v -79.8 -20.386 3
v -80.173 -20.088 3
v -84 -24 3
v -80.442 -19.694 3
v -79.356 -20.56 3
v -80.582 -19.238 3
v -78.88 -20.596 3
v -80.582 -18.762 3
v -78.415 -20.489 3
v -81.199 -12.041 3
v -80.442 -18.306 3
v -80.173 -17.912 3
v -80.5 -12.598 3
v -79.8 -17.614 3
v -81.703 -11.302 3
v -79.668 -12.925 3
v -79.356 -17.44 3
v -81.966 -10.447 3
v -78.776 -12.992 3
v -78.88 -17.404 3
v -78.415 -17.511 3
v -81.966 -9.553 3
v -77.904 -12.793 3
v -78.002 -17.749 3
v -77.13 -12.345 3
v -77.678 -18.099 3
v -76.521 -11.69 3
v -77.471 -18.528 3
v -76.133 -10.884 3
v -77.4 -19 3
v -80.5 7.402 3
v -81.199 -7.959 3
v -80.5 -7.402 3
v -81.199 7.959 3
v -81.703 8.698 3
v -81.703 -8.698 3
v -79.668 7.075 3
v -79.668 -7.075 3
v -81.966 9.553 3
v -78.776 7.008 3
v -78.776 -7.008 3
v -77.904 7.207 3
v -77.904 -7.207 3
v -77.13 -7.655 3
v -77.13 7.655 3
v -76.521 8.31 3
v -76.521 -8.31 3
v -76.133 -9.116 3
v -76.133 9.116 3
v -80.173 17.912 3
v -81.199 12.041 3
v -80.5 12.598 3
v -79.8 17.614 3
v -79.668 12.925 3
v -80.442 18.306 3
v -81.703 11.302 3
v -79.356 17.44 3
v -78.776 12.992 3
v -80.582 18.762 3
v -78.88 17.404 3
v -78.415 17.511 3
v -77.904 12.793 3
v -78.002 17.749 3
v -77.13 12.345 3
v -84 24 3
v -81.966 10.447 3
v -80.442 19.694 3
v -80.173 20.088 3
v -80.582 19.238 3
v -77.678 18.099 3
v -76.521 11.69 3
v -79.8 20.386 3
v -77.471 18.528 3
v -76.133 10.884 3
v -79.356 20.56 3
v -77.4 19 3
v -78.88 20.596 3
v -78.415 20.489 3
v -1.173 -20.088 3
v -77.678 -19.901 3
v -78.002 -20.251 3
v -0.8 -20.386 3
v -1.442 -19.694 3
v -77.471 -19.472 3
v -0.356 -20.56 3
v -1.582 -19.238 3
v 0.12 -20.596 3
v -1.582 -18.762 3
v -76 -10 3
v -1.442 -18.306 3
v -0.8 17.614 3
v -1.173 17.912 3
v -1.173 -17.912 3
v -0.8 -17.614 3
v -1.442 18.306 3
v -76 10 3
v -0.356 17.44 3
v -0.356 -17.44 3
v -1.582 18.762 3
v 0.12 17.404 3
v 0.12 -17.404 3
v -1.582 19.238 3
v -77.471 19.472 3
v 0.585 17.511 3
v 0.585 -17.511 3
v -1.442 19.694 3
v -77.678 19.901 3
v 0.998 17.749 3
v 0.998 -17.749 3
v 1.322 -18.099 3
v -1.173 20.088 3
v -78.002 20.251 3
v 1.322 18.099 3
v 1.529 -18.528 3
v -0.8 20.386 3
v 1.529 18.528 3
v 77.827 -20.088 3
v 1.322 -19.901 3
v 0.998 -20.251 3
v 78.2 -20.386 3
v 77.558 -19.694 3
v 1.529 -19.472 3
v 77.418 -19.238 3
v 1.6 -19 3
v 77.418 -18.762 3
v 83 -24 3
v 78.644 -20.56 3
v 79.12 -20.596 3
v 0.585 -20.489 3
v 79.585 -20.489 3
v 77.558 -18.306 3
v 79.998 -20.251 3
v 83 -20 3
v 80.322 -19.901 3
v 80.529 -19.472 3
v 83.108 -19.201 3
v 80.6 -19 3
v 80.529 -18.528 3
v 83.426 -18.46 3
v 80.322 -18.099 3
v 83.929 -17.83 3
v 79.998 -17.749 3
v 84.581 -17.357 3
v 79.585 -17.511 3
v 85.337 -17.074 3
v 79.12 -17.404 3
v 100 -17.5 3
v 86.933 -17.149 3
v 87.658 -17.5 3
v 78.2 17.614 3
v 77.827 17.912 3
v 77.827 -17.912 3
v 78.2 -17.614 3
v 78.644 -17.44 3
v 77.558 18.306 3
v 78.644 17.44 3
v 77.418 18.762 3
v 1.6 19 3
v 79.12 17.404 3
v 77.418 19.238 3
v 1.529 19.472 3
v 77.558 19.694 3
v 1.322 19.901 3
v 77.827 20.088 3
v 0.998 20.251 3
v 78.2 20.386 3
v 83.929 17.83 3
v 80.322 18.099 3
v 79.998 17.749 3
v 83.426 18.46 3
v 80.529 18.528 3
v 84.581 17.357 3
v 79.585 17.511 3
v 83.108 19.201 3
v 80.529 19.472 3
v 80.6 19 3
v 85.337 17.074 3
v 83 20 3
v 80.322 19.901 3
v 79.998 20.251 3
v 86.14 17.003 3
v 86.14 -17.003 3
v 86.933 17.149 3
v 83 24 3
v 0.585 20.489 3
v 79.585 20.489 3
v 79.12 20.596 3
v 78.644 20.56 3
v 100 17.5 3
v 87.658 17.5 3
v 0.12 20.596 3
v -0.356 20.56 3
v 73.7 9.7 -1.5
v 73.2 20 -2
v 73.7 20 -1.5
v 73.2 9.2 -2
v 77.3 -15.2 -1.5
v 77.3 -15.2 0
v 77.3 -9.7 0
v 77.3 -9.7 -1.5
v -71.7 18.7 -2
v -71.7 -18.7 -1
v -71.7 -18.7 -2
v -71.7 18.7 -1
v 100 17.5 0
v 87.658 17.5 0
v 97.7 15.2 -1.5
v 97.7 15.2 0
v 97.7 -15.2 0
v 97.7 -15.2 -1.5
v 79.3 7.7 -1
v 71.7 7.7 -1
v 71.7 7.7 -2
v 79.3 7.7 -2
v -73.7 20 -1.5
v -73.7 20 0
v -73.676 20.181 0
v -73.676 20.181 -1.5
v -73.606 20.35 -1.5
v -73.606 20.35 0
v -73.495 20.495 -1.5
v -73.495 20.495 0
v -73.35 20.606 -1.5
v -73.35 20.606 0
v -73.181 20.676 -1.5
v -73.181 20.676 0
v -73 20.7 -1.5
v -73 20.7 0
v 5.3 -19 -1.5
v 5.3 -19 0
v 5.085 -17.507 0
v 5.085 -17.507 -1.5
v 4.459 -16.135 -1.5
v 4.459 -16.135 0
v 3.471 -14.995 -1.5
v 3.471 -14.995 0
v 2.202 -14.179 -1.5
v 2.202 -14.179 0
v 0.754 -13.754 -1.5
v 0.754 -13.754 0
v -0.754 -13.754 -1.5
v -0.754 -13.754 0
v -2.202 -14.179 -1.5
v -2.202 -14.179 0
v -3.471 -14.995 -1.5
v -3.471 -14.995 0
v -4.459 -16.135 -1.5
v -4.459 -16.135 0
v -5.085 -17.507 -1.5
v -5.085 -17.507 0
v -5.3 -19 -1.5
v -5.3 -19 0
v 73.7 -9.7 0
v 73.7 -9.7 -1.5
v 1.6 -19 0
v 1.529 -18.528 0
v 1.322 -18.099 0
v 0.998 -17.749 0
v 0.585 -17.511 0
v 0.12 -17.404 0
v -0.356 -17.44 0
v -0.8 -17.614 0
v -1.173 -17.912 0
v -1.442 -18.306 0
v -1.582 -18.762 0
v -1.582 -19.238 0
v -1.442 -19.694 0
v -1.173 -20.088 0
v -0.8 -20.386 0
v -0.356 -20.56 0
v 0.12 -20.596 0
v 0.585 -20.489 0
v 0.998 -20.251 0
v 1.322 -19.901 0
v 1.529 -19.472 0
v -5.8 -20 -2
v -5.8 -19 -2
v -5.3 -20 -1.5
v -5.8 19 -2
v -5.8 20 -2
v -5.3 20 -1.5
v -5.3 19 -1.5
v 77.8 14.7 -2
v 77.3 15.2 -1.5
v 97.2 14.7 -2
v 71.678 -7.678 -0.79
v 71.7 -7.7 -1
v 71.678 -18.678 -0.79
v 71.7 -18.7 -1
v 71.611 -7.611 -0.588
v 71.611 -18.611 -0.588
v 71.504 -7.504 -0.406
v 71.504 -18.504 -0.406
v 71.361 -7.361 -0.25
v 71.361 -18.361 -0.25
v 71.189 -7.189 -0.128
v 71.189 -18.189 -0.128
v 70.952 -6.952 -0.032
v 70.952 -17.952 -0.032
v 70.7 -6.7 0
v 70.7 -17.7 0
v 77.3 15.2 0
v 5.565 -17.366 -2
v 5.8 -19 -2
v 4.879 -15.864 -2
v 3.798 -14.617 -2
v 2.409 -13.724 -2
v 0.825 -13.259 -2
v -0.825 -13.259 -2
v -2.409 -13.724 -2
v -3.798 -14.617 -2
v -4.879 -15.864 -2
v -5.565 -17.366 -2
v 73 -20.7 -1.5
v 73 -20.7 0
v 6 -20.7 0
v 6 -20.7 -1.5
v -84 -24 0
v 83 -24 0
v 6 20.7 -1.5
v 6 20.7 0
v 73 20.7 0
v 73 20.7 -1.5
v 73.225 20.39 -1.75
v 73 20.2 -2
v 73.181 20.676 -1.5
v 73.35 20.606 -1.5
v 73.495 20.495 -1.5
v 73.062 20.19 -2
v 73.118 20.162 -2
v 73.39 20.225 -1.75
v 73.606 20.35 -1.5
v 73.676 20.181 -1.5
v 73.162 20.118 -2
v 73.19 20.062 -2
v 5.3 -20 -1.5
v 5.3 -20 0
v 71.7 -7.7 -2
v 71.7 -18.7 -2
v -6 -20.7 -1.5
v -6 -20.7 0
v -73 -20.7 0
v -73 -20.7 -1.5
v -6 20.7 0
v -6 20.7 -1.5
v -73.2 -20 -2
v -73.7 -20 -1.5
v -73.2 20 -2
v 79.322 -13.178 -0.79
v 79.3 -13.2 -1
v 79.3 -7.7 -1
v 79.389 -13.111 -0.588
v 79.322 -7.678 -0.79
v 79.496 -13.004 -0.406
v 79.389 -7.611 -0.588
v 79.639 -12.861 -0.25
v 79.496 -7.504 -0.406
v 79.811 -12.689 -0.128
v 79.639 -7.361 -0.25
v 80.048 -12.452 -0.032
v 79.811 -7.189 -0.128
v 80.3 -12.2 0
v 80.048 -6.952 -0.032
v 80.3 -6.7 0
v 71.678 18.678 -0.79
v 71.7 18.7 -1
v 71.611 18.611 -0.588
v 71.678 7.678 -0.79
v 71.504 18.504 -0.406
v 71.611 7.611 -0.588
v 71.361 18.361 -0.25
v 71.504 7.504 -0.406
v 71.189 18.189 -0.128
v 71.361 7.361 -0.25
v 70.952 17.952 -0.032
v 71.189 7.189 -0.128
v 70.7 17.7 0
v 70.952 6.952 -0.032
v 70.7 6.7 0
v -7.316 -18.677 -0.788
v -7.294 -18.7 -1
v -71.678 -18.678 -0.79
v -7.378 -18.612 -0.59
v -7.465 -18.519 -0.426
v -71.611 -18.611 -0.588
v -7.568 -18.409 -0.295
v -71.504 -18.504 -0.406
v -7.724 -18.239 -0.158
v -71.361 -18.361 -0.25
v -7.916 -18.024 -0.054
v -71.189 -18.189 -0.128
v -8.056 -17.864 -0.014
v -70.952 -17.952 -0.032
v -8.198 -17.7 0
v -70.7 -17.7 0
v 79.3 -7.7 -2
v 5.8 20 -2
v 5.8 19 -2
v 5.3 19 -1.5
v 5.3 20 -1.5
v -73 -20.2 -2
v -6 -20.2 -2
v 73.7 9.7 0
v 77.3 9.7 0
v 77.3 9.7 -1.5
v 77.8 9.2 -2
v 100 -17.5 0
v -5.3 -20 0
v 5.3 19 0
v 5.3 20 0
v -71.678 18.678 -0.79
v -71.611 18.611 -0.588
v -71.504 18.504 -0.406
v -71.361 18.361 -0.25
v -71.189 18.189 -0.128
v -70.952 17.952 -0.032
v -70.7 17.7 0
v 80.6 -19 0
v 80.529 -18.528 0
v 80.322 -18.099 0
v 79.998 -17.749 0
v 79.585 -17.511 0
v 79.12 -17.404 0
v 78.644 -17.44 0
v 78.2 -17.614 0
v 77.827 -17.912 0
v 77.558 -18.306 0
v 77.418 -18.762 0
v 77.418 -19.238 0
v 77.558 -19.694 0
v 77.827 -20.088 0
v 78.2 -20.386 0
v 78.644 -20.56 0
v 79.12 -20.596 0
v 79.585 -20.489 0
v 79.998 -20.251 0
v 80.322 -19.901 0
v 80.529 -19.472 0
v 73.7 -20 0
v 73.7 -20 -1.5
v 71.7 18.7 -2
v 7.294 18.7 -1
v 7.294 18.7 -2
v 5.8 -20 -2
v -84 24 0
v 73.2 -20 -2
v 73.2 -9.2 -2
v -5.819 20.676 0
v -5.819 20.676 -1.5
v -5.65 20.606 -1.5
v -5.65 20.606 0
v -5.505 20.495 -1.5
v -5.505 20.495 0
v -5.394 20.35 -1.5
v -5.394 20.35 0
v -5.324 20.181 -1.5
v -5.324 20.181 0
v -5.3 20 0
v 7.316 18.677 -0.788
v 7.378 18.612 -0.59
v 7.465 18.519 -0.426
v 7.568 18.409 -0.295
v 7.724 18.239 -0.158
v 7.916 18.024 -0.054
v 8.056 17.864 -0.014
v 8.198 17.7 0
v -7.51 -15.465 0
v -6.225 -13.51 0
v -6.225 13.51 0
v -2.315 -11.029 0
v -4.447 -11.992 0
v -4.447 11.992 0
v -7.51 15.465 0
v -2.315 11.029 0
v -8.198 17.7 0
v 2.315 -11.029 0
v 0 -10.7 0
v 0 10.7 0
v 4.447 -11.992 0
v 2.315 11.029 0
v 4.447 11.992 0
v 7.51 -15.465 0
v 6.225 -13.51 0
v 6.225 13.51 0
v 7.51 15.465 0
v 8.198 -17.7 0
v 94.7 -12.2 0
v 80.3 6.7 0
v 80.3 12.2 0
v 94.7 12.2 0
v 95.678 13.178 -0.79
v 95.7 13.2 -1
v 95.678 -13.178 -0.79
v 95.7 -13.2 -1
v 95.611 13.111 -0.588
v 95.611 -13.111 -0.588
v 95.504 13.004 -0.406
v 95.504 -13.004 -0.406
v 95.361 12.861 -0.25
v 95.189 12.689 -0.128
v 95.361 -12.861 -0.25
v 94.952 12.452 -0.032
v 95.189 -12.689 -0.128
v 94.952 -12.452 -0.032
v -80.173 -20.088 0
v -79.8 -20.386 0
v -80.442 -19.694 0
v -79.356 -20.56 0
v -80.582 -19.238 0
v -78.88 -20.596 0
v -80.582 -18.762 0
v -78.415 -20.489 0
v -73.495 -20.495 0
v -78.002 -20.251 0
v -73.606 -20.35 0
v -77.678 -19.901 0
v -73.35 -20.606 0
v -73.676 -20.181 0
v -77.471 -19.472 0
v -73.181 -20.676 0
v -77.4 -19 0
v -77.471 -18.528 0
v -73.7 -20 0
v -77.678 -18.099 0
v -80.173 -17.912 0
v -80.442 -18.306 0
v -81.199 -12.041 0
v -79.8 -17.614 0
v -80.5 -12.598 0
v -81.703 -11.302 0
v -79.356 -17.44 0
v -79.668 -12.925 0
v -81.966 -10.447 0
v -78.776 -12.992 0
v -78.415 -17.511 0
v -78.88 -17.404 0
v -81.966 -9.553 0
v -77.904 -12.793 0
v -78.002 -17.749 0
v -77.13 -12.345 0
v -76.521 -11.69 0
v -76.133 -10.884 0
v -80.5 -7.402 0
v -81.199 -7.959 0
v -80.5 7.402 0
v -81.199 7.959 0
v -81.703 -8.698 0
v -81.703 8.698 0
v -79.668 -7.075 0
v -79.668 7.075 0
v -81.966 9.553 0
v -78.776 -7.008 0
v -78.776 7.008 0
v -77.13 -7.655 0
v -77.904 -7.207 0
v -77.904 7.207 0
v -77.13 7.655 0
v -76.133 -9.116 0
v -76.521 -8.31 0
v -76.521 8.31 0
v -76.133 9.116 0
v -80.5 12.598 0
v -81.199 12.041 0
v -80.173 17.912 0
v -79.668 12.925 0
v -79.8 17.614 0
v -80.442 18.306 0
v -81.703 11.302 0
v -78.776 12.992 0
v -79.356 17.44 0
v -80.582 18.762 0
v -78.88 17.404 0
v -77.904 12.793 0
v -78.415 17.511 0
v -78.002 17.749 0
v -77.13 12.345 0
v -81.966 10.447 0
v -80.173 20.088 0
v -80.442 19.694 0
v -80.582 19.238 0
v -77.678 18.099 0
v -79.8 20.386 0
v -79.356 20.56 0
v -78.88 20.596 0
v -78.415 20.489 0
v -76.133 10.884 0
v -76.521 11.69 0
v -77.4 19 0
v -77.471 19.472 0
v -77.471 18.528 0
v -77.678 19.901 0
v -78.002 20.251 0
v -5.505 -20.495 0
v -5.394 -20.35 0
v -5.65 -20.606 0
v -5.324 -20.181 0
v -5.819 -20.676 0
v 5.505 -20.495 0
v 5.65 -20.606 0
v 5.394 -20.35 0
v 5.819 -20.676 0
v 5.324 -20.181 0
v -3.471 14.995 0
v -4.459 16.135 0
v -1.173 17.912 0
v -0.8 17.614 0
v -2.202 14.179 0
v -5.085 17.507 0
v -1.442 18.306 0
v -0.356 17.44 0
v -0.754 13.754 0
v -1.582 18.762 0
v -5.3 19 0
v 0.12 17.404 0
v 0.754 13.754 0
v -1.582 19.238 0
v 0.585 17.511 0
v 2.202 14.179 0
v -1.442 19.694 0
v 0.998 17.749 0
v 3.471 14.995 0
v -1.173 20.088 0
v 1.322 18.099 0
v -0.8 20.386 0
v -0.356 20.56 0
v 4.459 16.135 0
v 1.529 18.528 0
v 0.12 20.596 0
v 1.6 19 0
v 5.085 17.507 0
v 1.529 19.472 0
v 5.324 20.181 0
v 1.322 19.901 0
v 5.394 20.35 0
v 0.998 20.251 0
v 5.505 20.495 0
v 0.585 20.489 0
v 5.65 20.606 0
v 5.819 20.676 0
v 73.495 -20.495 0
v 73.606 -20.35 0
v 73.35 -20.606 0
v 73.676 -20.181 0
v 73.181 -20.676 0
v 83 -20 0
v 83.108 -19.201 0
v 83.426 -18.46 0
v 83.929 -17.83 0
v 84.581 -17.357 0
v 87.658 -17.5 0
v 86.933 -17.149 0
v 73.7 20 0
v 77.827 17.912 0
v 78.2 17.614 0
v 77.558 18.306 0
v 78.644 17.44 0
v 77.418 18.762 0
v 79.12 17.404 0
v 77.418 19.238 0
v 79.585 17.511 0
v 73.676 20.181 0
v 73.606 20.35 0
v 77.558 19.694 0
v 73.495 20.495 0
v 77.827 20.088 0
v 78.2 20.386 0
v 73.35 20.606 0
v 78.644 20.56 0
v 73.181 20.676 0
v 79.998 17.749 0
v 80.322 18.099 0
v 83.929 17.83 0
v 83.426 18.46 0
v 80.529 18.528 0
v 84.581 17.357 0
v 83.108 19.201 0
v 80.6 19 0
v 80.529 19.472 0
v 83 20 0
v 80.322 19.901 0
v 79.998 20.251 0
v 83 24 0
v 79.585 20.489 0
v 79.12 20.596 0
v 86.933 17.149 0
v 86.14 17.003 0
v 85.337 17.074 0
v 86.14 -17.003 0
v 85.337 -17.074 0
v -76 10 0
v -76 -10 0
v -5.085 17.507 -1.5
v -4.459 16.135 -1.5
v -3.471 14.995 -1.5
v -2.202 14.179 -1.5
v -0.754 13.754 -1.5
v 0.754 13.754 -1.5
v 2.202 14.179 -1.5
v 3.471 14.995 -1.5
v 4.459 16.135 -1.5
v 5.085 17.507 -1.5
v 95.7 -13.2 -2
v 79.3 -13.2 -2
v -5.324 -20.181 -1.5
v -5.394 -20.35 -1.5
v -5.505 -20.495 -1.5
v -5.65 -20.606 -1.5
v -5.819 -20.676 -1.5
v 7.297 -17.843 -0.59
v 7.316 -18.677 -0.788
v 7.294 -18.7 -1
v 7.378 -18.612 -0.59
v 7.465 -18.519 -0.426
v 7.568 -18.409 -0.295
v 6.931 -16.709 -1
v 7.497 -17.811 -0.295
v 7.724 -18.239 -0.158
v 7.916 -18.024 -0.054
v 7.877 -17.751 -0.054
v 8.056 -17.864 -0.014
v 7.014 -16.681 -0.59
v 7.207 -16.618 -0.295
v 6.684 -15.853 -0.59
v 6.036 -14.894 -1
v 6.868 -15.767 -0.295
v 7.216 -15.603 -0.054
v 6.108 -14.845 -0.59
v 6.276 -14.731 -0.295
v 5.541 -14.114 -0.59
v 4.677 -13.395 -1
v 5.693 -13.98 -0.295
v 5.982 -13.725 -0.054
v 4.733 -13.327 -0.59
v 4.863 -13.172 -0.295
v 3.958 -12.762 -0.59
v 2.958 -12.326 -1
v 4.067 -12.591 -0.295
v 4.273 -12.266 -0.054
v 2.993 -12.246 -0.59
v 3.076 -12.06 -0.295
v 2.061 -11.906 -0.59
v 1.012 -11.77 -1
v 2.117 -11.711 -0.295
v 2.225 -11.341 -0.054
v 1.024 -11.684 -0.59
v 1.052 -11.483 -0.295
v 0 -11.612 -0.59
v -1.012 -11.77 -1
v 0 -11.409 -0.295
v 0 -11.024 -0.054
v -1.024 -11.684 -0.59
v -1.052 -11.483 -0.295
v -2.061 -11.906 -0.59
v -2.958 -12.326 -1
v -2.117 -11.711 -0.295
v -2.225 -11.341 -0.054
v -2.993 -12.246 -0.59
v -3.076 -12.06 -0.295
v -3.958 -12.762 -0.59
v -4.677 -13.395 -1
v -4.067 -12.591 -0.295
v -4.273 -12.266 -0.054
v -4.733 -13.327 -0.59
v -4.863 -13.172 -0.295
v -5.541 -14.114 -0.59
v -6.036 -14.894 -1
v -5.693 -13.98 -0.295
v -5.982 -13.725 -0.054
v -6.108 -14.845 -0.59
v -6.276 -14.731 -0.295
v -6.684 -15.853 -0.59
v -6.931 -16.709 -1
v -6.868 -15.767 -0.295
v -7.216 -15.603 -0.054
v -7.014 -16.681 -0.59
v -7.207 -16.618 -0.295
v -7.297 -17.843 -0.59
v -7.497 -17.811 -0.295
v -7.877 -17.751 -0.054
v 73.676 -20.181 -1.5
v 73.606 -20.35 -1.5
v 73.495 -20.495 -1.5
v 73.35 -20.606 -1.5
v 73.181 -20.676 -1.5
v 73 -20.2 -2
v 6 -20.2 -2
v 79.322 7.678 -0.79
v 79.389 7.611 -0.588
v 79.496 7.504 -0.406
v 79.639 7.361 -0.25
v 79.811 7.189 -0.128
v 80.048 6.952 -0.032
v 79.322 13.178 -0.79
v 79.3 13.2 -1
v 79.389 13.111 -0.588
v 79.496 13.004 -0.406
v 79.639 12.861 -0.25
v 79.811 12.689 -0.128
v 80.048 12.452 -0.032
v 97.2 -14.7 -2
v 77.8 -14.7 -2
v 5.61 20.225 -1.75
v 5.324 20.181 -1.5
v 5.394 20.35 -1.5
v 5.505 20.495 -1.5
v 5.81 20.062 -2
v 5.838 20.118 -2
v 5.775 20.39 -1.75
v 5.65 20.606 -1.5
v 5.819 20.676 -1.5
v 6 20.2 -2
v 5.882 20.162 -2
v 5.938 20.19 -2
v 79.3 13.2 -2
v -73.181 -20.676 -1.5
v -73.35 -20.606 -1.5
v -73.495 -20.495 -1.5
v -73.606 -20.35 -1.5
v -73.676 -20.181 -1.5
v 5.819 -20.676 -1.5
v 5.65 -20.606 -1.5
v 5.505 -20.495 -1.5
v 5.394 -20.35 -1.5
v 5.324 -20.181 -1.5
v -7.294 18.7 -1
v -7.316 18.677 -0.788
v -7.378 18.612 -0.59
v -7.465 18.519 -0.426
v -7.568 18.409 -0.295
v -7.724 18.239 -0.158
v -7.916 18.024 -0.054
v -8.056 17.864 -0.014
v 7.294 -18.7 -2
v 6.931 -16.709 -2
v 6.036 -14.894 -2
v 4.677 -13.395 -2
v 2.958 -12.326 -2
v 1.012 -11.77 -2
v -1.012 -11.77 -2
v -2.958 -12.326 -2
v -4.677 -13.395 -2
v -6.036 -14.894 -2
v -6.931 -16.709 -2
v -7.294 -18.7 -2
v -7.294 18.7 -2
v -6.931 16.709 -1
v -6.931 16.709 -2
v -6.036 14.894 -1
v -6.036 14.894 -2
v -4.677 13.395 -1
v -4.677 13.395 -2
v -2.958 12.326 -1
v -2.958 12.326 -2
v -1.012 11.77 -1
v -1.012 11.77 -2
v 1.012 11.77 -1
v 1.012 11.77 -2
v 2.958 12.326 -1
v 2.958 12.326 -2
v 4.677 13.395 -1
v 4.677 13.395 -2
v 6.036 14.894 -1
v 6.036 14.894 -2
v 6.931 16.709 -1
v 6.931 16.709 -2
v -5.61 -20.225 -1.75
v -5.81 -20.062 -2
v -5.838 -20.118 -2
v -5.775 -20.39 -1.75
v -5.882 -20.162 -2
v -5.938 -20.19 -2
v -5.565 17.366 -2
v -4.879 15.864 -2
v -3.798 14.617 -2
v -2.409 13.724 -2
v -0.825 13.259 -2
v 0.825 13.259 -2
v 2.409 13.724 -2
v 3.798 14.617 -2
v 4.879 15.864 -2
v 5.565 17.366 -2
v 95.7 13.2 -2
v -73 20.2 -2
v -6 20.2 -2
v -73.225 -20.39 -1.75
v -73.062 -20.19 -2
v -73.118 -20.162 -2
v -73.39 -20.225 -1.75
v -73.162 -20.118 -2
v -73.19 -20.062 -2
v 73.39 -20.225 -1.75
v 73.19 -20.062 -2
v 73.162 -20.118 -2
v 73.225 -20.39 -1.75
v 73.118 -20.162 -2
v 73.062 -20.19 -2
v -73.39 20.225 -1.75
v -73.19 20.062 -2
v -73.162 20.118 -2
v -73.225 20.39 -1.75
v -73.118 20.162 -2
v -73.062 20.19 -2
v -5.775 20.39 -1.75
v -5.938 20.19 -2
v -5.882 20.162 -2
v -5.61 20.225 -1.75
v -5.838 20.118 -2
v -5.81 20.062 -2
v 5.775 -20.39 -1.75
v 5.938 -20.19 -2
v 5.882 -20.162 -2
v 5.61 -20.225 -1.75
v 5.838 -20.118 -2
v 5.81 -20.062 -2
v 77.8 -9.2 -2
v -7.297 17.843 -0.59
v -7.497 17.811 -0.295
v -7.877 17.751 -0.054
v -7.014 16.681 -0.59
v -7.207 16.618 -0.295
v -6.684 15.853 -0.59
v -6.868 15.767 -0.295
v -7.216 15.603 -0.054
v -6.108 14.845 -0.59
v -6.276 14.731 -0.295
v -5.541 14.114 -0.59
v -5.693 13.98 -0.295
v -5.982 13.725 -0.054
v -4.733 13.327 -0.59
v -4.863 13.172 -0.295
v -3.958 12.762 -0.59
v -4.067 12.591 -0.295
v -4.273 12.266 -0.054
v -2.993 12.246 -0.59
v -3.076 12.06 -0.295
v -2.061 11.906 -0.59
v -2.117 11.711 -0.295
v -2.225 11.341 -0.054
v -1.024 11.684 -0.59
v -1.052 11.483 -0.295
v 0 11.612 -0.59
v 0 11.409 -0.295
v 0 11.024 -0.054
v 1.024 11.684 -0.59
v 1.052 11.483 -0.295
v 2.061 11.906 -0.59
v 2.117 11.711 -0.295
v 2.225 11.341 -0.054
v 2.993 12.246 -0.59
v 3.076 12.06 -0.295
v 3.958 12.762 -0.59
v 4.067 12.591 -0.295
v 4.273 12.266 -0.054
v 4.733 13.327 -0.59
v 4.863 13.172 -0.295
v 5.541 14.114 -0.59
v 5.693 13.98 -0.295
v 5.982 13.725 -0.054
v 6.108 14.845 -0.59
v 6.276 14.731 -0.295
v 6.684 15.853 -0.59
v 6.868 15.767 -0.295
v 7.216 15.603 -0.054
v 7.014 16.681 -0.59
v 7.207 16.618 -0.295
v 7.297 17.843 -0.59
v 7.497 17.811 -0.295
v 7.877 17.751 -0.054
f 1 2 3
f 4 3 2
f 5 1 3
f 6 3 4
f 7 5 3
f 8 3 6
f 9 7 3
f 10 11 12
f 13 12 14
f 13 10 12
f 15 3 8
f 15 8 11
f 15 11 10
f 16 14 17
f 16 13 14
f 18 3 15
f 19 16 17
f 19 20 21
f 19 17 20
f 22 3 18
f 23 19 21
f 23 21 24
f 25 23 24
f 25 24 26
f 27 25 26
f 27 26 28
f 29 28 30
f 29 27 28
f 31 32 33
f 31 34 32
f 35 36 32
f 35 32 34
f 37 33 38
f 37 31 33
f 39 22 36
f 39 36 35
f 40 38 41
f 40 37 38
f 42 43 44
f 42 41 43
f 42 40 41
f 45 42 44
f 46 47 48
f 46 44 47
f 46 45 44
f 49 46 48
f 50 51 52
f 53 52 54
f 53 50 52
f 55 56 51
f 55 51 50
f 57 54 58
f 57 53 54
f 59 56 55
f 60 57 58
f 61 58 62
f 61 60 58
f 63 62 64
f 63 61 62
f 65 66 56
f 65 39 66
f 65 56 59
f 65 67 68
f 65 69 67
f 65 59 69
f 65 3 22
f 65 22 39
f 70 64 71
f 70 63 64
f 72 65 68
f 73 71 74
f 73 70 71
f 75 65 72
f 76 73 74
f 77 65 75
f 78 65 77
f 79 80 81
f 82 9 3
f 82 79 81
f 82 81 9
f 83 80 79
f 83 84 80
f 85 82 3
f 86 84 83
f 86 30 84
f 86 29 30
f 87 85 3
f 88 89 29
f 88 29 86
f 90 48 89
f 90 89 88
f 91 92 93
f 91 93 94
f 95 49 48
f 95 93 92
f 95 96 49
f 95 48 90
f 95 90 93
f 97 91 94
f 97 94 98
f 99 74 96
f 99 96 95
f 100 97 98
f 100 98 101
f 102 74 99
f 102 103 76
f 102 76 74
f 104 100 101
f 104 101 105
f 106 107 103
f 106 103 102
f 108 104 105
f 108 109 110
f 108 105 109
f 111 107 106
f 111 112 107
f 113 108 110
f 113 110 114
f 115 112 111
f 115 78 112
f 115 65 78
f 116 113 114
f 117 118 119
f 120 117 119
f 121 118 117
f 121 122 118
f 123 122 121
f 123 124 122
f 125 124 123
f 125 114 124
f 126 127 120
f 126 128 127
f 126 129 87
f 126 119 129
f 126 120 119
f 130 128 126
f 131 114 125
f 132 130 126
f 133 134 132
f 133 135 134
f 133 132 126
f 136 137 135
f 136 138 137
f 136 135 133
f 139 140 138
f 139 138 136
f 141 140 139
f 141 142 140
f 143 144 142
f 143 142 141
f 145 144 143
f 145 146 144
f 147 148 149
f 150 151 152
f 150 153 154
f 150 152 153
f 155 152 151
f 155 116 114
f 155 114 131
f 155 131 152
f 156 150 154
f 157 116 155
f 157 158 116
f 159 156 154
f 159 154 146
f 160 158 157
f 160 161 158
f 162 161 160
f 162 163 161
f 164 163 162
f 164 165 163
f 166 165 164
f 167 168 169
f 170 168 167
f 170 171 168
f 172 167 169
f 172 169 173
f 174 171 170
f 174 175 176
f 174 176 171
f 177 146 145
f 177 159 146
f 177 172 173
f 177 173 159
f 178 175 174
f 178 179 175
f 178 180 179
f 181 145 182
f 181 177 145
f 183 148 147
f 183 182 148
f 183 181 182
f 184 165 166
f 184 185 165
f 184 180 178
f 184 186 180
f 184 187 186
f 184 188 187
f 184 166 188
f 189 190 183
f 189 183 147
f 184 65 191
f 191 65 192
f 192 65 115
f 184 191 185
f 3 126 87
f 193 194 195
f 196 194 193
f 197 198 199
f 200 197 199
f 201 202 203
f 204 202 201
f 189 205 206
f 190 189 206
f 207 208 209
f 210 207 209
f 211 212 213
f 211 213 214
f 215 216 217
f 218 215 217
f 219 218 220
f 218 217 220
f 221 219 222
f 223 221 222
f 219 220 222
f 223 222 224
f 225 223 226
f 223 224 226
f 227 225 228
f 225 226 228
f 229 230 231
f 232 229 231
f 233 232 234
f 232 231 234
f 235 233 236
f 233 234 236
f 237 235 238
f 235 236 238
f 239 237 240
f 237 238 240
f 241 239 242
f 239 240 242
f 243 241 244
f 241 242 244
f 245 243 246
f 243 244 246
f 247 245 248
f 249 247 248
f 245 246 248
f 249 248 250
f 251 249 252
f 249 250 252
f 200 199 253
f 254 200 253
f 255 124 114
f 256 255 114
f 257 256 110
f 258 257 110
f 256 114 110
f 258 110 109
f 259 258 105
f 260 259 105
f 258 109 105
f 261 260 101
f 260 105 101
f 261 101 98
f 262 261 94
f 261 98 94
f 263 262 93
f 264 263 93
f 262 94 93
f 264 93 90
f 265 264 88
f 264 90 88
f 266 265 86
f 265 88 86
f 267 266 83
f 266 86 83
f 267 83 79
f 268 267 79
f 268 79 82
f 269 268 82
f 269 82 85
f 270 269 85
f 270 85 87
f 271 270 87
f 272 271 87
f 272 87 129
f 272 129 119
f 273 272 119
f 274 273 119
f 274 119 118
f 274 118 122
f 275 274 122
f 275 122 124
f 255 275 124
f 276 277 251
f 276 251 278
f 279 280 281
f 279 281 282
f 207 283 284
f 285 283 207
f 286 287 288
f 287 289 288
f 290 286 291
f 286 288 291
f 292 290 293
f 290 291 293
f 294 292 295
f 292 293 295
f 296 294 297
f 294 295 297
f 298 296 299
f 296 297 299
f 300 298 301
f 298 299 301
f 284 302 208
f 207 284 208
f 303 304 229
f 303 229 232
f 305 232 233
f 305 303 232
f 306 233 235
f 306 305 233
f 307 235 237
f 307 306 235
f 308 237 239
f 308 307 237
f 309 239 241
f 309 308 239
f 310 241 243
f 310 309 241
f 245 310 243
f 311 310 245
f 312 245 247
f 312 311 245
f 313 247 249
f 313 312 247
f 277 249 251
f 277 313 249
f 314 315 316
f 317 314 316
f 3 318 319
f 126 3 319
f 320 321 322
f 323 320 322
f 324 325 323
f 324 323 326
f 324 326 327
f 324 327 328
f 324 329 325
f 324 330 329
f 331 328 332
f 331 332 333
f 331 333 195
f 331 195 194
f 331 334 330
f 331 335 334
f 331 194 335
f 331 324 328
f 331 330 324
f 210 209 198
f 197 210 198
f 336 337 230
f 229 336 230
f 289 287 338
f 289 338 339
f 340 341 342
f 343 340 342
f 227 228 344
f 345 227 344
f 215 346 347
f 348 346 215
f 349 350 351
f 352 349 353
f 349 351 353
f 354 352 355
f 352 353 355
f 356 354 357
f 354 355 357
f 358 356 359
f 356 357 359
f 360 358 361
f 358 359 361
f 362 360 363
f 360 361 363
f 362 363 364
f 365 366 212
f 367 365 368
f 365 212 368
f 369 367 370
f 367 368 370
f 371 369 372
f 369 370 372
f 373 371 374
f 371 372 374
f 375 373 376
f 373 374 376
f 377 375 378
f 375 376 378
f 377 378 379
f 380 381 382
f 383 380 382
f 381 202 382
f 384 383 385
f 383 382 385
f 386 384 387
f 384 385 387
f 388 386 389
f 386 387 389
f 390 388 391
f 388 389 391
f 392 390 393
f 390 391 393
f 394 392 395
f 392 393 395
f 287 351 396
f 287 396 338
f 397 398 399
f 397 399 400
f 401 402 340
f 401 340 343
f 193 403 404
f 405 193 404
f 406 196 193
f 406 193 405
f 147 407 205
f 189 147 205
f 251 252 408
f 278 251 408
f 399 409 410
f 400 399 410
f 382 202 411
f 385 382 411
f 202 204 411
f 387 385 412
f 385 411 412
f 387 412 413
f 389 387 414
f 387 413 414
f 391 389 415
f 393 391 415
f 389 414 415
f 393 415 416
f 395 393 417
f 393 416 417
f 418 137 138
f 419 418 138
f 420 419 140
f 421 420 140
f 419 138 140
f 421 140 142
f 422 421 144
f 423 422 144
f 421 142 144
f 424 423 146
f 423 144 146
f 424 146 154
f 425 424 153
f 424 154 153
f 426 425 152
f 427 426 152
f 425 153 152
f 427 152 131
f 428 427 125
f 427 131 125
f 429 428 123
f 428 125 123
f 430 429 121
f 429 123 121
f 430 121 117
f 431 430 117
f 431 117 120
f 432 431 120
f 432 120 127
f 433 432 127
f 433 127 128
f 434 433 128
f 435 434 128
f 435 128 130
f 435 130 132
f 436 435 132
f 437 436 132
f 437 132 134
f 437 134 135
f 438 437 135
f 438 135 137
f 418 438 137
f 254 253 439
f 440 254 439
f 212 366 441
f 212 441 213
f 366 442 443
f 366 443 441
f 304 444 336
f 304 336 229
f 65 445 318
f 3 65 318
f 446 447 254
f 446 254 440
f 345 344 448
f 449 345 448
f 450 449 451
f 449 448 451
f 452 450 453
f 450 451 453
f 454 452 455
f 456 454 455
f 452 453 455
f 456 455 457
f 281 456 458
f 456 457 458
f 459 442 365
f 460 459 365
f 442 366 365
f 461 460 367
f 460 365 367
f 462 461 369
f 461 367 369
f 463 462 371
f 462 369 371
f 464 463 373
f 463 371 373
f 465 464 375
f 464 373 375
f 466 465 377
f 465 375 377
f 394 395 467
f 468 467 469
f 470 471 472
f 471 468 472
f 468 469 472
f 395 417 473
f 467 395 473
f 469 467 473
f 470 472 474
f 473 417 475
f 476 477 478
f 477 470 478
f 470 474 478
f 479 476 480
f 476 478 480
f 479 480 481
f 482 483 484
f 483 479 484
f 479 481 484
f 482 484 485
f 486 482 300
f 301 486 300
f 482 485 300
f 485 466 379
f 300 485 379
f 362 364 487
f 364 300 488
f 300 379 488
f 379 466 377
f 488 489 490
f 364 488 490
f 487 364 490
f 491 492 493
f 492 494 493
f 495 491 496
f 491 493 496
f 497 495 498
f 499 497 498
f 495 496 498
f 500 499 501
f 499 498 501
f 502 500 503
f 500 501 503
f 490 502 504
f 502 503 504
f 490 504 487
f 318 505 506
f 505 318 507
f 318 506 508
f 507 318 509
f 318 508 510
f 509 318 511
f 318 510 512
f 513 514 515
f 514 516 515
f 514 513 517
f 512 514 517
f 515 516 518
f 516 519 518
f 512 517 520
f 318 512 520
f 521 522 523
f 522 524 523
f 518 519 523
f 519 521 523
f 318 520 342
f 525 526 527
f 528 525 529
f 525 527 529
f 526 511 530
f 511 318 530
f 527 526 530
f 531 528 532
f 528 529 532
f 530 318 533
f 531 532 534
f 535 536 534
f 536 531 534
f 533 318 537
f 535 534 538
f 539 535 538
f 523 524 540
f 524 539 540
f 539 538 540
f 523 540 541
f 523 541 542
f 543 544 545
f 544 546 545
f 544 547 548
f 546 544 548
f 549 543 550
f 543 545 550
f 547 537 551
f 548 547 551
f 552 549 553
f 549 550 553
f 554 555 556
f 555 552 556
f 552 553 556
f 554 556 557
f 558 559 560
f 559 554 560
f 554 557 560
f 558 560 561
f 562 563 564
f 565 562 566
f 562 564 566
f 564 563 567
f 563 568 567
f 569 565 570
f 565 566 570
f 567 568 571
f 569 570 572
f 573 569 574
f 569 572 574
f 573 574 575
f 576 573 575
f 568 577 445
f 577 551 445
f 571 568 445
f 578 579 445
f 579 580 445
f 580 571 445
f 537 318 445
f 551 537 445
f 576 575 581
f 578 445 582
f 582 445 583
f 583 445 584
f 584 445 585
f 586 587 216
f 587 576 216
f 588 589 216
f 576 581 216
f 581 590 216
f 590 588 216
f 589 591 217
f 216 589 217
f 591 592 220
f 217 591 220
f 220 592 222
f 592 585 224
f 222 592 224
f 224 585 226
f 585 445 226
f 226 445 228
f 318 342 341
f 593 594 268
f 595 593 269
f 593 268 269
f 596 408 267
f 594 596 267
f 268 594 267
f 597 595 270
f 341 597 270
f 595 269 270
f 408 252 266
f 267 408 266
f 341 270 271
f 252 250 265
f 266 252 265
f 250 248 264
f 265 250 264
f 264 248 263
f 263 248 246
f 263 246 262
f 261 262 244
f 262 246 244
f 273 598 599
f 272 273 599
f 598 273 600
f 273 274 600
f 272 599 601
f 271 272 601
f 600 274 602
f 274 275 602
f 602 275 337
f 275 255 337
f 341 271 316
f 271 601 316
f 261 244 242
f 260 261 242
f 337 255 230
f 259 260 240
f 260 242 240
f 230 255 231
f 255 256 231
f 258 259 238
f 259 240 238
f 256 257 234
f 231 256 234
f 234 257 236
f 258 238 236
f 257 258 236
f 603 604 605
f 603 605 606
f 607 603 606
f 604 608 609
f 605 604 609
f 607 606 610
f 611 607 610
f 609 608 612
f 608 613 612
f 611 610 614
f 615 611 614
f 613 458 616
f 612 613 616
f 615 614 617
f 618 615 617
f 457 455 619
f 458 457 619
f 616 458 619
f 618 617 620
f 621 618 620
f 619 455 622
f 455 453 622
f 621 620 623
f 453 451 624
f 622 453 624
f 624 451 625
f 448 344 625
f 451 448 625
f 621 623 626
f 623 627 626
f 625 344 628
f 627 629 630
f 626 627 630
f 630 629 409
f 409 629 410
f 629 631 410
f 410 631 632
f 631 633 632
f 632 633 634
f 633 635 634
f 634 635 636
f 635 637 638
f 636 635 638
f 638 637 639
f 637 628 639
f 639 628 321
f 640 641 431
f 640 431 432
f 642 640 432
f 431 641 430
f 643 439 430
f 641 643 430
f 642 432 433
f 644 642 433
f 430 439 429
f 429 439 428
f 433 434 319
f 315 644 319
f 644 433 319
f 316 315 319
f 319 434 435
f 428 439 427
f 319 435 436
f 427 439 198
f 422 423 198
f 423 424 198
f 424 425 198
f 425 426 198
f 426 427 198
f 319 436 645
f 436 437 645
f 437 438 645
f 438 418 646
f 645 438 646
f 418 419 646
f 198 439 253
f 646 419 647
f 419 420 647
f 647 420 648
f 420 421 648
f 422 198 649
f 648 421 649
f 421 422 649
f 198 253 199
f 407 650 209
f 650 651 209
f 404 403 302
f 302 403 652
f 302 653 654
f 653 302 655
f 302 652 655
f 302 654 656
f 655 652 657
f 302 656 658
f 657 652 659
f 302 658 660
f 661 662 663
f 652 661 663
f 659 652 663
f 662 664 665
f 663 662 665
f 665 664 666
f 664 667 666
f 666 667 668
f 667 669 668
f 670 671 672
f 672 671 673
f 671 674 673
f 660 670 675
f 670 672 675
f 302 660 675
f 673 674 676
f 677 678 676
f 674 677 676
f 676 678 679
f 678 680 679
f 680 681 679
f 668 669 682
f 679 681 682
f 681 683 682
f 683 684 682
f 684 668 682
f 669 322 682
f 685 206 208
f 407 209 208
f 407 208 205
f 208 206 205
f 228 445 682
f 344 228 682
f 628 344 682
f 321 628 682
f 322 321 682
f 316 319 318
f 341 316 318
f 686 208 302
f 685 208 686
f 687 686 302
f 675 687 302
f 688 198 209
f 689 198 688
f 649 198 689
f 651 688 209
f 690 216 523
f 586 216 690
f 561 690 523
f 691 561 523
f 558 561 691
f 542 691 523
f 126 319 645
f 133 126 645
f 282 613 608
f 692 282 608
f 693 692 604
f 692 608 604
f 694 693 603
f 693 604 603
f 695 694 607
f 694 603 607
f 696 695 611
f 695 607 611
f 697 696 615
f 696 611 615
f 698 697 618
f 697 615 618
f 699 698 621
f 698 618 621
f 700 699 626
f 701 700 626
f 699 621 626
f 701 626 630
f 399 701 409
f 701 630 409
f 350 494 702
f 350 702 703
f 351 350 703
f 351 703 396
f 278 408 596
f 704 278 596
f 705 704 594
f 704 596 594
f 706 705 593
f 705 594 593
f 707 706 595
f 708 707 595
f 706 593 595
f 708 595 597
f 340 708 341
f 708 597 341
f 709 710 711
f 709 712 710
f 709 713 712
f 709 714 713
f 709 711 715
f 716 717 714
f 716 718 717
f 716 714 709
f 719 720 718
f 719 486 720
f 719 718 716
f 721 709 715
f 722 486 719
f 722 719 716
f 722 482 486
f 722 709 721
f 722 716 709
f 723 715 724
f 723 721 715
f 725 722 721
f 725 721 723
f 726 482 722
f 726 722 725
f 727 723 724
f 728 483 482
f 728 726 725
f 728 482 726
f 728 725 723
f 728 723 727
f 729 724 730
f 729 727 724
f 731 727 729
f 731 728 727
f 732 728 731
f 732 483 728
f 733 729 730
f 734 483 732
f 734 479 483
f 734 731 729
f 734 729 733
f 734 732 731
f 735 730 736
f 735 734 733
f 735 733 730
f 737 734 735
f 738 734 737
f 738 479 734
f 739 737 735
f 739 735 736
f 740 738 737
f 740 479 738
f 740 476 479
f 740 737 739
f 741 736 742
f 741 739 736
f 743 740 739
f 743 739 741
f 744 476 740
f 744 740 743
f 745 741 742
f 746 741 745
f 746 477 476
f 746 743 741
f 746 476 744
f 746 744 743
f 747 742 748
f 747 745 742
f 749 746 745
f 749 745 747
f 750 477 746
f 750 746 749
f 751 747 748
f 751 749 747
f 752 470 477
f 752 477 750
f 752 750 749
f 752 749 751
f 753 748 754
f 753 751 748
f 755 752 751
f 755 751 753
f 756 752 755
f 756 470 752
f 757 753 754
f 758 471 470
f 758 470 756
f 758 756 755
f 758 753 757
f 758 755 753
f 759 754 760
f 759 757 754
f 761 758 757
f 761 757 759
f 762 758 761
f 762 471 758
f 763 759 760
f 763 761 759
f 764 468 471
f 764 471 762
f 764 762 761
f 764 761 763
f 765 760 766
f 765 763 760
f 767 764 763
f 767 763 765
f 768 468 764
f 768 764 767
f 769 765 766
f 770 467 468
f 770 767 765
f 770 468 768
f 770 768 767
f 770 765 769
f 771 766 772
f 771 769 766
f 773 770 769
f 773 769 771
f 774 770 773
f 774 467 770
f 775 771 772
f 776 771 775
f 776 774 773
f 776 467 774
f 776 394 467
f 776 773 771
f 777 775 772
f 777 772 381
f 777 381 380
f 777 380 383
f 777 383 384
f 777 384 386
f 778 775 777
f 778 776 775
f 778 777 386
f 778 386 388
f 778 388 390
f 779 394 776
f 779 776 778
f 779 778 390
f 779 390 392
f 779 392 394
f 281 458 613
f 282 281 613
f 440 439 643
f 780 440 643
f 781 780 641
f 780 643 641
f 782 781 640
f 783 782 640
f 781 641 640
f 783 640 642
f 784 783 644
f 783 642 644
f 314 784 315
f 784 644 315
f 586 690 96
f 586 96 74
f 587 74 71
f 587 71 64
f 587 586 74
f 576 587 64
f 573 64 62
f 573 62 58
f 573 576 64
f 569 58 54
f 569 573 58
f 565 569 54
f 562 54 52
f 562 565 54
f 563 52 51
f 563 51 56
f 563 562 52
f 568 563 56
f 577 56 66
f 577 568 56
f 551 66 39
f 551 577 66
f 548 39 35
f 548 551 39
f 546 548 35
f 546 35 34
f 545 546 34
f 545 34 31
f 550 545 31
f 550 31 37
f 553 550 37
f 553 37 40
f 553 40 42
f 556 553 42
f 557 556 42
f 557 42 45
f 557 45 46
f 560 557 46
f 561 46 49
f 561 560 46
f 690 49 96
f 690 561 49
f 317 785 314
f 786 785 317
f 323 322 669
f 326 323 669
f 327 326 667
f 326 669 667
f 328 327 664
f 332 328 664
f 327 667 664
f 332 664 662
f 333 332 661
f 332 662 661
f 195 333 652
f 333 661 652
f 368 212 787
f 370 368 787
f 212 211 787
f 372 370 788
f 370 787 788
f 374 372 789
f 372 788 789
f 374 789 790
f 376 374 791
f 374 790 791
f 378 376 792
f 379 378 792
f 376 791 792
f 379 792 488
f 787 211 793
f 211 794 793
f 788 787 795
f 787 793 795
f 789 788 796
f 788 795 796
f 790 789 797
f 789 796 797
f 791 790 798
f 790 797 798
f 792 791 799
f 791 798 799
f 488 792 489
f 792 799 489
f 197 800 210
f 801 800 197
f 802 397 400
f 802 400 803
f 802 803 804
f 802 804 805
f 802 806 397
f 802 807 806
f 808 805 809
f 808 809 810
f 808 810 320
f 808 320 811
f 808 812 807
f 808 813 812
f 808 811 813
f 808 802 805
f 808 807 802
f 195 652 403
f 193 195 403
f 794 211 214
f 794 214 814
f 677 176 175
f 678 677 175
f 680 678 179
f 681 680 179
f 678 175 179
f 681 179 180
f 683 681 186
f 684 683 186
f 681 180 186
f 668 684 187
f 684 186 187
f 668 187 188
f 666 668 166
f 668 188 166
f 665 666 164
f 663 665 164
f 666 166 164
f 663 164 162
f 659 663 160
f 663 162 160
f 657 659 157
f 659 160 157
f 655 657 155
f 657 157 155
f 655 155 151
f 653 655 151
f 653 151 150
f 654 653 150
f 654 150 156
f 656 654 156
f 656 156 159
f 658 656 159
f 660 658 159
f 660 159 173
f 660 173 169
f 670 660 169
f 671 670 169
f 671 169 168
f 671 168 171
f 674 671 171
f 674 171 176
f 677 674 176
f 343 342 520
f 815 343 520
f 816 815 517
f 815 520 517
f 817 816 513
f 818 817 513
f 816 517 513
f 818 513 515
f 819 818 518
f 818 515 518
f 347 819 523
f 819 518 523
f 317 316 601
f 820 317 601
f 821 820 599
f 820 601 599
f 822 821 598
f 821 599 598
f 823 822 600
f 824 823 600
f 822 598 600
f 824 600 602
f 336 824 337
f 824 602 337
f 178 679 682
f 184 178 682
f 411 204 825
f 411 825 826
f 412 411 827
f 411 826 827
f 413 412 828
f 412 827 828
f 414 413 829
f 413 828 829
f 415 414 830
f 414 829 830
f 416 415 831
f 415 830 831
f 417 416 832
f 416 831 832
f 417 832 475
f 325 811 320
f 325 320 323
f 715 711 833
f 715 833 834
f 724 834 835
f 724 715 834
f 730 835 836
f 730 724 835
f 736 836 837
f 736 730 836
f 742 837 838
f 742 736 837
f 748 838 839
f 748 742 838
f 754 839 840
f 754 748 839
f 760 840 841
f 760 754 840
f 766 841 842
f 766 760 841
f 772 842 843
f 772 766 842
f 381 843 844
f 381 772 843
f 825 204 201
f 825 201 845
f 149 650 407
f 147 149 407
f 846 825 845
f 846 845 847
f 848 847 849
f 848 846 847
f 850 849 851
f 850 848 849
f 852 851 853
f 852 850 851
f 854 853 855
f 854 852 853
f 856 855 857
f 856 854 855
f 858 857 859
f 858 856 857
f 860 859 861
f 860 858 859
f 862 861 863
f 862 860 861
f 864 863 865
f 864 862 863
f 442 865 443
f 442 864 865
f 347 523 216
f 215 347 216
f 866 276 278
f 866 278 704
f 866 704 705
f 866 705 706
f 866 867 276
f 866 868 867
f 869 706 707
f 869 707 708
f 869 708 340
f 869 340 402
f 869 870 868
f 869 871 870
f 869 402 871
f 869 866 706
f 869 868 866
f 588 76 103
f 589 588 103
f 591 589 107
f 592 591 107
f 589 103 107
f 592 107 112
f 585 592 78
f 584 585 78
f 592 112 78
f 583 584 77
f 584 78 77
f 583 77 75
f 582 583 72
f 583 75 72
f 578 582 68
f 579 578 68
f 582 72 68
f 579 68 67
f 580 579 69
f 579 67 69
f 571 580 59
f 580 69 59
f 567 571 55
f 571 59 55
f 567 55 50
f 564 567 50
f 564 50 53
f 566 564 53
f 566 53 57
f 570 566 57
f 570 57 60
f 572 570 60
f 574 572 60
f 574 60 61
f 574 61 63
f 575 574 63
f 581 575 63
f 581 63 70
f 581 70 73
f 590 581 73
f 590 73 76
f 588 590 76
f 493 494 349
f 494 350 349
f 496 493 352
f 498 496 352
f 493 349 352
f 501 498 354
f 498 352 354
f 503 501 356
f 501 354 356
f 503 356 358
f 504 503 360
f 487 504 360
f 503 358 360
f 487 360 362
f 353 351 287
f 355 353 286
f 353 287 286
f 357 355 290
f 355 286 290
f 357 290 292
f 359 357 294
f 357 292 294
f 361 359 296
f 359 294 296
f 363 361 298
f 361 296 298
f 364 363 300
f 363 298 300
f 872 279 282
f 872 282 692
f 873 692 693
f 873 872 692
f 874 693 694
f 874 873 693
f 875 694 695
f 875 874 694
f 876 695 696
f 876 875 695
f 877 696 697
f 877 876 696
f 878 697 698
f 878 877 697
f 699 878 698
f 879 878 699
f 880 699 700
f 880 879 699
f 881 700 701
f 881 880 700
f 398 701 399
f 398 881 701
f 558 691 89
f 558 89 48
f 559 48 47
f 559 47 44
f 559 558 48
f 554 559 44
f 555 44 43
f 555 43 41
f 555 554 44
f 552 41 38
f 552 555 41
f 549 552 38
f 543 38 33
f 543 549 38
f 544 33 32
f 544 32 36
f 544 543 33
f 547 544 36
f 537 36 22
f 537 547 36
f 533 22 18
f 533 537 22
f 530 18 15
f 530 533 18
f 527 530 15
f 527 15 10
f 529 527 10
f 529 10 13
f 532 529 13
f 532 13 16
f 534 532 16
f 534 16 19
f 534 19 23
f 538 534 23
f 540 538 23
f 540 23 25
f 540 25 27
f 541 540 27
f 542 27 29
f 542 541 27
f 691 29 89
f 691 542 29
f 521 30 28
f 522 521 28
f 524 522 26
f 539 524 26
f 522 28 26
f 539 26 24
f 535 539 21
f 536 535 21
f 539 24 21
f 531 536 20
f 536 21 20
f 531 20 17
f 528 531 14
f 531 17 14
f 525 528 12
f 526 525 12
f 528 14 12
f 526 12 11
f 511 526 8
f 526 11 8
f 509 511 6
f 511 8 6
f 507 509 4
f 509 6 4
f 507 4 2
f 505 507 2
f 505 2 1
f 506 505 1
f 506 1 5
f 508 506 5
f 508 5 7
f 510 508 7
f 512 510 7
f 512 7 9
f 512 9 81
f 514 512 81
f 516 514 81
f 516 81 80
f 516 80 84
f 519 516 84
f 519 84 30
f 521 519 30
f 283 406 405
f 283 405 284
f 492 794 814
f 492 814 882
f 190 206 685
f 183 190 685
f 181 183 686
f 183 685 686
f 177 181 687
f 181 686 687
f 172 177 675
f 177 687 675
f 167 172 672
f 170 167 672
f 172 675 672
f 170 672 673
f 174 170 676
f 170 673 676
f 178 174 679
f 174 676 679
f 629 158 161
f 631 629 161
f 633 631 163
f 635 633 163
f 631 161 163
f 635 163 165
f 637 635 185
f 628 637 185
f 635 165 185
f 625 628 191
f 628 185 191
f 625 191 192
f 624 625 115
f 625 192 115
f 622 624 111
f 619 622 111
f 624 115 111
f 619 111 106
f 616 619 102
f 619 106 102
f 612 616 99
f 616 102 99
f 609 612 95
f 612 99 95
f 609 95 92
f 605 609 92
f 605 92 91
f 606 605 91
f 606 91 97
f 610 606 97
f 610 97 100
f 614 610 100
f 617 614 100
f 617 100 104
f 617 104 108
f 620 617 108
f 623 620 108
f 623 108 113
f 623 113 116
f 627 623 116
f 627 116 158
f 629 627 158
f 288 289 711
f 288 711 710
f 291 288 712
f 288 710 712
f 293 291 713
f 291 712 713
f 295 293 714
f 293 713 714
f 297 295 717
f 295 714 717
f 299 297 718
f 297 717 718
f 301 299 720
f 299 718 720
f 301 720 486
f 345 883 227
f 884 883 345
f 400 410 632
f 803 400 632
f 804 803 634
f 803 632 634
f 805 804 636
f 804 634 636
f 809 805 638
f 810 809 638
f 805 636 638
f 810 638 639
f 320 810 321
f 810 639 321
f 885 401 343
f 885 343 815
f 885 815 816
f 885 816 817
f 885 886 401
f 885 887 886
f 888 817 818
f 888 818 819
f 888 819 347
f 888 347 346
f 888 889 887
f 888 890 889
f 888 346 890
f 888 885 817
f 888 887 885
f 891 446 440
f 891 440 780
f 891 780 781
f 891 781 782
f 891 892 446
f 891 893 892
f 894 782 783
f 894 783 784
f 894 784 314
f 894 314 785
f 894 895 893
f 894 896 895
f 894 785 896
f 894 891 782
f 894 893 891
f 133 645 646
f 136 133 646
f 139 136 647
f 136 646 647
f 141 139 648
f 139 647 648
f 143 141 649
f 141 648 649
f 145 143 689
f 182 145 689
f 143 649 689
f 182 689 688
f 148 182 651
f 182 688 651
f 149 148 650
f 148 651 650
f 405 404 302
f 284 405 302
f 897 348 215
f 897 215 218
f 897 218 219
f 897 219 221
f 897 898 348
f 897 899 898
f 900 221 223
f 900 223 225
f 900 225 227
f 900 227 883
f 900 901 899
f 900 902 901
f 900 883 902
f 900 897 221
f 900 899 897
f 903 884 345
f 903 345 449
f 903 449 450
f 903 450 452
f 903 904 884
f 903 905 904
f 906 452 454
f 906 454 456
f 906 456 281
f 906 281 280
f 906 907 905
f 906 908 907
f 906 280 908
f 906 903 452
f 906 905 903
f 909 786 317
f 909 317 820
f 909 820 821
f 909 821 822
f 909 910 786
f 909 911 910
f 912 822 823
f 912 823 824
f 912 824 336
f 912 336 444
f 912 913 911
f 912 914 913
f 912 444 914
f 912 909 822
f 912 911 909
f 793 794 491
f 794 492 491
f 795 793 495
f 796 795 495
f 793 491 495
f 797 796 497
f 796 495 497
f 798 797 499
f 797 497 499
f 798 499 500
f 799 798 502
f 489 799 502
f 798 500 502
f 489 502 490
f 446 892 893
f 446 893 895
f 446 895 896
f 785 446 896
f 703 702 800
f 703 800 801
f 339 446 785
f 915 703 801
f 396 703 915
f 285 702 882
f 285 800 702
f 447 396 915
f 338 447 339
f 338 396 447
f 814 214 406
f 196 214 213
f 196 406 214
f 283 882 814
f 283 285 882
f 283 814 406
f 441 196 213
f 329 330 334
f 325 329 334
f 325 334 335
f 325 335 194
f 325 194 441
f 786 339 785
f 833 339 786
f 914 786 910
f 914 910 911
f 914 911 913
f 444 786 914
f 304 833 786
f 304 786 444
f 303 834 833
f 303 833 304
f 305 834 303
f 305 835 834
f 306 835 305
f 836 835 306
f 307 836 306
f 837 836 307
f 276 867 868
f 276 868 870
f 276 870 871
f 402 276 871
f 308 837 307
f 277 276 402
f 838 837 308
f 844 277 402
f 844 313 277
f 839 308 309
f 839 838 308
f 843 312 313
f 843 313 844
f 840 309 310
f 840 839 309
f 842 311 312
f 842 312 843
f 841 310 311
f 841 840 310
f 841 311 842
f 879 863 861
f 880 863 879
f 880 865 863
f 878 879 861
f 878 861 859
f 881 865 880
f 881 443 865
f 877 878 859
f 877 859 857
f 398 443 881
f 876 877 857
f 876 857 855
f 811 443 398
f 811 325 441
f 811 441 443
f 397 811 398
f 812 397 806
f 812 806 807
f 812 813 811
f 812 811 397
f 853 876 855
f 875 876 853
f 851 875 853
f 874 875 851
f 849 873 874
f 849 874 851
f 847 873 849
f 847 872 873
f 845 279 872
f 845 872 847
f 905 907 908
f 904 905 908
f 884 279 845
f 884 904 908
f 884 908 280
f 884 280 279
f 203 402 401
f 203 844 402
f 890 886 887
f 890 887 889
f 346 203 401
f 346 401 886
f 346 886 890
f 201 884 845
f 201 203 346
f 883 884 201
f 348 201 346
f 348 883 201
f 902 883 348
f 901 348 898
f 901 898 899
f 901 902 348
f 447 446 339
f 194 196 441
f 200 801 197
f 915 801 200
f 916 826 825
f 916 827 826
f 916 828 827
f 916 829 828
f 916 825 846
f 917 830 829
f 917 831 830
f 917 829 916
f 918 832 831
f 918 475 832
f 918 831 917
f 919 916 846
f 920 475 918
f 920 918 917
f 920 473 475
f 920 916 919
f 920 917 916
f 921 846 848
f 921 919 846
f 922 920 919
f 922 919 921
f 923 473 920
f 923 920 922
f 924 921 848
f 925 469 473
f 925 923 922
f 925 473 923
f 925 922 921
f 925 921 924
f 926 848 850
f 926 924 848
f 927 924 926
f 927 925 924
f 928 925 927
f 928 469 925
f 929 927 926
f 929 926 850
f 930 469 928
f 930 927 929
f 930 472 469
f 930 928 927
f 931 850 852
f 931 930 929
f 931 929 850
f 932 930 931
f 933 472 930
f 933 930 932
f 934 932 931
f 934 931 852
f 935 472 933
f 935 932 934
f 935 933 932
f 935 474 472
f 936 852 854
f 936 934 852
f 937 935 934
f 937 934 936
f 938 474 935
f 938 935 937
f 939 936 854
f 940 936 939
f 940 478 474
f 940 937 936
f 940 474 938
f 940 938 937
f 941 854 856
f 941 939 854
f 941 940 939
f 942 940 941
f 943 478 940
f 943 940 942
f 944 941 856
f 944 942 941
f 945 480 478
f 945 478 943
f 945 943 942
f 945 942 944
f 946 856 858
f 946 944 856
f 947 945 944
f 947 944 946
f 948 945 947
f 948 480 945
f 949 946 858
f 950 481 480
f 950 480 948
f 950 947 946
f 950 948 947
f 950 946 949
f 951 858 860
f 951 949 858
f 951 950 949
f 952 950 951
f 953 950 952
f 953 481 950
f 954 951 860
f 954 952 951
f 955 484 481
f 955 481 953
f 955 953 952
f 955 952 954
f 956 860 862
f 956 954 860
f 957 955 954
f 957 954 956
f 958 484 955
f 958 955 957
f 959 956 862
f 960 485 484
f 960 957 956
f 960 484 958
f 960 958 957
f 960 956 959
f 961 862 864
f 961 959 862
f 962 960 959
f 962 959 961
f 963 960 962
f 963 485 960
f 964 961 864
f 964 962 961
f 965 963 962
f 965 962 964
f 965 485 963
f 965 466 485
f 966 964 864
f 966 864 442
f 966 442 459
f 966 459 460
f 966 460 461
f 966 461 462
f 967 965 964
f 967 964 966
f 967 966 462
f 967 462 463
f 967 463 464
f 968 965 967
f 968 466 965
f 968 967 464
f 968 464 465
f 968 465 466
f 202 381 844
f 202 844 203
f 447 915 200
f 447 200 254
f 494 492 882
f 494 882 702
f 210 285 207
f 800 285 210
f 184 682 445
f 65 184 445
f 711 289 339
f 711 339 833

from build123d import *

# Parameters (mm, degrees)
SKETCH1_R           = 3
BOSS_EXTRUDE1_DEPTH = 3
BOSS_EXTRUDE2_DEPTH = 2
CHAMFER1_SIZE       = 0.5
FILLET1_R           = 1
SKETCH3_R           = 1.6
CUT_EXTRUDE1_DEPTH  = 103.961157725


with BuildPart() as part:
    # Sketch1 → Boss-Extrude1 (new body)
    with BuildSketch(Plane.XY):
        with BuildLine():
            Line((87.658312395, -17.5), (100, -17.5))
            Line((100, -17.5), (100, 17.5))
            Line((100, 17.5), (87.658312395, 17.5))
            ThreePointArc((87.658312395, 17.5), (84.581362835, 17.356617963), (83, 20))
            Line((83, 20), (83, 24))
            Line((83, 24), (-84, 24))
            Line((-84, 24), (-84, -24))
            Line((-84, -24), (83, -24))
            Line((83, -24), (83, -20))
            ThreePointArc((83, -20), (84.581362835, -17.356617963), (87.658312395, -17.5))
        make_face()
        with Locations((-79, -10)):
            Circle(SKETCH1_R, mode=Mode.SUBTRACT)
        with Locations((-79, 10)):
            Circle(SKETCH1_R, mode=Mode.SUBTRACT)
    extrude(amount=BOSS_EXTRUDE1_DEPTH)

    # Sketch2 → Boss-Extrude2 (add)
    with BuildSketch(Plane(origin=(0, 0, 0), x_dir=(-1, 0, 0), z_dir=(0, 0, -1))):
        with BuildLine():
            Line((-73.7, 20), (-73.7, 9.7))
            Line((-73.7, 9.7), (-77.3, 9.7))
            Line((-77.3, 9.7), (-77.3, 15.2))
            Line((-77.3, 15.2), (-97.7, 15.2))
            Line((-97.7, 15.2), (-97.7, -15.2))
            Line((-97.7, -15.2), (-77.3, -15.2))
            Line((-77.3, -15.2), (-77.3, -9.7))
            Line((-77.3, -9.7), (-73.7, -9.7))
            Line((-73.7, -9.7), (-73.7, -20))
            ThreePointArc((-73.7, -20), (-73.494974747, -20.494974747), (-73, -20.7))
            Line((-73, -20.7), (-6, -20.7))
            ThreePointArc((-6, -20.7), (-5.505025253, -20.494974747), (-5.3, -20))
            Line((-5.3, -20), (-5.3, -19))
            ThreePointArc((-5.3, -19), (0, -13.7), (5.3, -19))
            Line((5.3, -19), (5.3, -20))
            ThreePointArc((5.3, -20), (5.505025253, -20.494974747), (6, -20.7))
            Line((6, -20.7), (73, -20.7))
            ThreePointArc((73, -20.7), (73.494974747, -20.494974747), (73.7, -20))
            Line((73.7, -20), (73.7, 20))
            ThreePointArc((73.7, 20), (73.494974747, 20.494974747), (73, 20.7))
            Line((73, 20.7), (6, 20.7))
            ThreePointArc((6, 20.7), (5.505025253, 20.494974747), (5.3, 20))
            Line((5.3, 20), (5.3, 19))
            ThreePointArc((5.3, 19), (0, 13.7), (-5.3, 19))
            Line((-5.3, 19), (-5.3, 20))
            ThreePointArc((-5.3, 20), (-5.505025253, 20.494974747), (-6, 20.7))
            Line((-6, 20.7), (-73, 20.7))
            ThreePointArc((-73, 20.7), (-73.494974747, 20.494974747), (-73.7, 20))
        make_face()
        with BuildLine():
            Line((-7.293833012, 18.7), (-71.7, 18.7))
            Line((-71.7, 18.7), (-71.7, 7.7))
            Line((-71.7, 7.7), (-79.3, 7.7))
            Line((-79.3, 7.7), (-79.3, 13.2))
            Line((-79.3, 13.2), (-95.7, 13.2))
            Line((-95.7, 13.2), (-95.7, -13.2))
            Line((-95.7, -13.2), (-79.3, -13.2))
            Line((-79.3, -13.2), (-79.3, -7.7))
            Line((-79.3, -7.7), (-71.7, -7.7))
            Line((-71.7, -7.7), (-71.7, -18.7))
            Line((-71.7, -18.7), (-7.293833012, -18.7))
            ThreePointArc((-7.293833012, -18.7), (0, -11.7), (7.293833012, -18.7))
            Line((7.293833012, -18.7), (71.7, -18.7))
            Line((71.7, -18.7), (71.7, 18.7))
            Line((71.7, 18.7), (7.293833012, 18.7))
            ThreePointArc((7.293833012, 18.7), (0, 11.7), (-7.293833012, 18.7))
        make_face(mode=Mode.SUBTRACT)
    extrude(amount=BOSS_EXTRUDE2_DEPTH)

    # Chamfer1
    chamfer1_edges = [part.edges().sort_by_distance(p)[0] for p in [
        (73.494974747, 20.494974747, -2),
        (73.7, 14.85, -2),
        (75.5, 9.7, -2),
        (77.3, 12.45, -2),
        (87.5, 15.2, -2),
        (97.7, 0, -2),
        (87.5, -15.2, -2),
        (77.3, -12.45, -2),
        (75.5, -9.7, -2),
        (73.7, -14.85, -2),
        (73.494974747, -20.494974747, -2),
        (39.5, -20.7, -2),
        (5.505025253, -20.494974747, -2),
        (5.3, -19.5, -2),
        (0, -13.7, -2),
        (-5.3, -19.5, -2),
        (-5.505025253, -20.494974747, -2),
        (-39.5, -20.7, -2),
        (-73.494974747, -20.494974747, -2),
        (-73.7, 0, -2),
        (-73.494974747, 20.494974747, -2),
        (-39.5, 20.7, -2),
        (-5.505025253, 20.494974747, -2),
        (-5.3, 19.5, -2),
        (0, 13.7, -2),
        (5.3, 19.5, -2),
        (5.505025253, 20.494974747, -2),
        (39.5, 20.7, -2),
    ]]
    chamfer(chamfer1_edges, length=CHAMFER1_SIZE)

    # Fillet1
    fillet1_edges = [part.edges().sort_by_distance(p)[0] for p in [
        (0, 11.7, 0),
        (39.496916506, 18.7, 0),
        (71.7, 13.2, 0),
        (75.5, 7.7, 0),
        (79.3, 10.45, 0),
        (87.5, 13.2, 0),
        (95.7, 0, 0),
        (87.5, -13.2, 0),
        (79.3, -10.45, 0),
        (75.5, -7.7, 0),
        (71.7, -13.2, 0),
        (39.496916506, -18.7, 0),
        (0, -11.7, 0),
        (-39.496916506, -18.7, 0),
        (-71.7, 0, 0),
        (-39.496916506, 18.7, 0),
    ]]
    fillet(fillet1_edges, radius=FILLET1_R)

    # Sketch3 → Cut-Extrude1 (cut, through all)
    with BuildSketch(Plane.XY.offset(3)):
        with Locations((-79, 19)):
            Circle(SKETCH3_R)
        with Locations((-79, -19)):
            Circle(SKETCH3_R)
        with Locations((79, 19)):
            Circle(SKETCH3_R)
        with Locations((79, -19)):
            Circle(SKETCH3_R)
        with Locations((0, 19)):
            Circle(SKETCH3_R)
        with Locations((0, -19)):
            Circle(SKETCH3_R)
    extrude(amount=-CUT_EXTRUDE1_DEPTH, mode=Mode.SUBTRACT)


solid = part.part
